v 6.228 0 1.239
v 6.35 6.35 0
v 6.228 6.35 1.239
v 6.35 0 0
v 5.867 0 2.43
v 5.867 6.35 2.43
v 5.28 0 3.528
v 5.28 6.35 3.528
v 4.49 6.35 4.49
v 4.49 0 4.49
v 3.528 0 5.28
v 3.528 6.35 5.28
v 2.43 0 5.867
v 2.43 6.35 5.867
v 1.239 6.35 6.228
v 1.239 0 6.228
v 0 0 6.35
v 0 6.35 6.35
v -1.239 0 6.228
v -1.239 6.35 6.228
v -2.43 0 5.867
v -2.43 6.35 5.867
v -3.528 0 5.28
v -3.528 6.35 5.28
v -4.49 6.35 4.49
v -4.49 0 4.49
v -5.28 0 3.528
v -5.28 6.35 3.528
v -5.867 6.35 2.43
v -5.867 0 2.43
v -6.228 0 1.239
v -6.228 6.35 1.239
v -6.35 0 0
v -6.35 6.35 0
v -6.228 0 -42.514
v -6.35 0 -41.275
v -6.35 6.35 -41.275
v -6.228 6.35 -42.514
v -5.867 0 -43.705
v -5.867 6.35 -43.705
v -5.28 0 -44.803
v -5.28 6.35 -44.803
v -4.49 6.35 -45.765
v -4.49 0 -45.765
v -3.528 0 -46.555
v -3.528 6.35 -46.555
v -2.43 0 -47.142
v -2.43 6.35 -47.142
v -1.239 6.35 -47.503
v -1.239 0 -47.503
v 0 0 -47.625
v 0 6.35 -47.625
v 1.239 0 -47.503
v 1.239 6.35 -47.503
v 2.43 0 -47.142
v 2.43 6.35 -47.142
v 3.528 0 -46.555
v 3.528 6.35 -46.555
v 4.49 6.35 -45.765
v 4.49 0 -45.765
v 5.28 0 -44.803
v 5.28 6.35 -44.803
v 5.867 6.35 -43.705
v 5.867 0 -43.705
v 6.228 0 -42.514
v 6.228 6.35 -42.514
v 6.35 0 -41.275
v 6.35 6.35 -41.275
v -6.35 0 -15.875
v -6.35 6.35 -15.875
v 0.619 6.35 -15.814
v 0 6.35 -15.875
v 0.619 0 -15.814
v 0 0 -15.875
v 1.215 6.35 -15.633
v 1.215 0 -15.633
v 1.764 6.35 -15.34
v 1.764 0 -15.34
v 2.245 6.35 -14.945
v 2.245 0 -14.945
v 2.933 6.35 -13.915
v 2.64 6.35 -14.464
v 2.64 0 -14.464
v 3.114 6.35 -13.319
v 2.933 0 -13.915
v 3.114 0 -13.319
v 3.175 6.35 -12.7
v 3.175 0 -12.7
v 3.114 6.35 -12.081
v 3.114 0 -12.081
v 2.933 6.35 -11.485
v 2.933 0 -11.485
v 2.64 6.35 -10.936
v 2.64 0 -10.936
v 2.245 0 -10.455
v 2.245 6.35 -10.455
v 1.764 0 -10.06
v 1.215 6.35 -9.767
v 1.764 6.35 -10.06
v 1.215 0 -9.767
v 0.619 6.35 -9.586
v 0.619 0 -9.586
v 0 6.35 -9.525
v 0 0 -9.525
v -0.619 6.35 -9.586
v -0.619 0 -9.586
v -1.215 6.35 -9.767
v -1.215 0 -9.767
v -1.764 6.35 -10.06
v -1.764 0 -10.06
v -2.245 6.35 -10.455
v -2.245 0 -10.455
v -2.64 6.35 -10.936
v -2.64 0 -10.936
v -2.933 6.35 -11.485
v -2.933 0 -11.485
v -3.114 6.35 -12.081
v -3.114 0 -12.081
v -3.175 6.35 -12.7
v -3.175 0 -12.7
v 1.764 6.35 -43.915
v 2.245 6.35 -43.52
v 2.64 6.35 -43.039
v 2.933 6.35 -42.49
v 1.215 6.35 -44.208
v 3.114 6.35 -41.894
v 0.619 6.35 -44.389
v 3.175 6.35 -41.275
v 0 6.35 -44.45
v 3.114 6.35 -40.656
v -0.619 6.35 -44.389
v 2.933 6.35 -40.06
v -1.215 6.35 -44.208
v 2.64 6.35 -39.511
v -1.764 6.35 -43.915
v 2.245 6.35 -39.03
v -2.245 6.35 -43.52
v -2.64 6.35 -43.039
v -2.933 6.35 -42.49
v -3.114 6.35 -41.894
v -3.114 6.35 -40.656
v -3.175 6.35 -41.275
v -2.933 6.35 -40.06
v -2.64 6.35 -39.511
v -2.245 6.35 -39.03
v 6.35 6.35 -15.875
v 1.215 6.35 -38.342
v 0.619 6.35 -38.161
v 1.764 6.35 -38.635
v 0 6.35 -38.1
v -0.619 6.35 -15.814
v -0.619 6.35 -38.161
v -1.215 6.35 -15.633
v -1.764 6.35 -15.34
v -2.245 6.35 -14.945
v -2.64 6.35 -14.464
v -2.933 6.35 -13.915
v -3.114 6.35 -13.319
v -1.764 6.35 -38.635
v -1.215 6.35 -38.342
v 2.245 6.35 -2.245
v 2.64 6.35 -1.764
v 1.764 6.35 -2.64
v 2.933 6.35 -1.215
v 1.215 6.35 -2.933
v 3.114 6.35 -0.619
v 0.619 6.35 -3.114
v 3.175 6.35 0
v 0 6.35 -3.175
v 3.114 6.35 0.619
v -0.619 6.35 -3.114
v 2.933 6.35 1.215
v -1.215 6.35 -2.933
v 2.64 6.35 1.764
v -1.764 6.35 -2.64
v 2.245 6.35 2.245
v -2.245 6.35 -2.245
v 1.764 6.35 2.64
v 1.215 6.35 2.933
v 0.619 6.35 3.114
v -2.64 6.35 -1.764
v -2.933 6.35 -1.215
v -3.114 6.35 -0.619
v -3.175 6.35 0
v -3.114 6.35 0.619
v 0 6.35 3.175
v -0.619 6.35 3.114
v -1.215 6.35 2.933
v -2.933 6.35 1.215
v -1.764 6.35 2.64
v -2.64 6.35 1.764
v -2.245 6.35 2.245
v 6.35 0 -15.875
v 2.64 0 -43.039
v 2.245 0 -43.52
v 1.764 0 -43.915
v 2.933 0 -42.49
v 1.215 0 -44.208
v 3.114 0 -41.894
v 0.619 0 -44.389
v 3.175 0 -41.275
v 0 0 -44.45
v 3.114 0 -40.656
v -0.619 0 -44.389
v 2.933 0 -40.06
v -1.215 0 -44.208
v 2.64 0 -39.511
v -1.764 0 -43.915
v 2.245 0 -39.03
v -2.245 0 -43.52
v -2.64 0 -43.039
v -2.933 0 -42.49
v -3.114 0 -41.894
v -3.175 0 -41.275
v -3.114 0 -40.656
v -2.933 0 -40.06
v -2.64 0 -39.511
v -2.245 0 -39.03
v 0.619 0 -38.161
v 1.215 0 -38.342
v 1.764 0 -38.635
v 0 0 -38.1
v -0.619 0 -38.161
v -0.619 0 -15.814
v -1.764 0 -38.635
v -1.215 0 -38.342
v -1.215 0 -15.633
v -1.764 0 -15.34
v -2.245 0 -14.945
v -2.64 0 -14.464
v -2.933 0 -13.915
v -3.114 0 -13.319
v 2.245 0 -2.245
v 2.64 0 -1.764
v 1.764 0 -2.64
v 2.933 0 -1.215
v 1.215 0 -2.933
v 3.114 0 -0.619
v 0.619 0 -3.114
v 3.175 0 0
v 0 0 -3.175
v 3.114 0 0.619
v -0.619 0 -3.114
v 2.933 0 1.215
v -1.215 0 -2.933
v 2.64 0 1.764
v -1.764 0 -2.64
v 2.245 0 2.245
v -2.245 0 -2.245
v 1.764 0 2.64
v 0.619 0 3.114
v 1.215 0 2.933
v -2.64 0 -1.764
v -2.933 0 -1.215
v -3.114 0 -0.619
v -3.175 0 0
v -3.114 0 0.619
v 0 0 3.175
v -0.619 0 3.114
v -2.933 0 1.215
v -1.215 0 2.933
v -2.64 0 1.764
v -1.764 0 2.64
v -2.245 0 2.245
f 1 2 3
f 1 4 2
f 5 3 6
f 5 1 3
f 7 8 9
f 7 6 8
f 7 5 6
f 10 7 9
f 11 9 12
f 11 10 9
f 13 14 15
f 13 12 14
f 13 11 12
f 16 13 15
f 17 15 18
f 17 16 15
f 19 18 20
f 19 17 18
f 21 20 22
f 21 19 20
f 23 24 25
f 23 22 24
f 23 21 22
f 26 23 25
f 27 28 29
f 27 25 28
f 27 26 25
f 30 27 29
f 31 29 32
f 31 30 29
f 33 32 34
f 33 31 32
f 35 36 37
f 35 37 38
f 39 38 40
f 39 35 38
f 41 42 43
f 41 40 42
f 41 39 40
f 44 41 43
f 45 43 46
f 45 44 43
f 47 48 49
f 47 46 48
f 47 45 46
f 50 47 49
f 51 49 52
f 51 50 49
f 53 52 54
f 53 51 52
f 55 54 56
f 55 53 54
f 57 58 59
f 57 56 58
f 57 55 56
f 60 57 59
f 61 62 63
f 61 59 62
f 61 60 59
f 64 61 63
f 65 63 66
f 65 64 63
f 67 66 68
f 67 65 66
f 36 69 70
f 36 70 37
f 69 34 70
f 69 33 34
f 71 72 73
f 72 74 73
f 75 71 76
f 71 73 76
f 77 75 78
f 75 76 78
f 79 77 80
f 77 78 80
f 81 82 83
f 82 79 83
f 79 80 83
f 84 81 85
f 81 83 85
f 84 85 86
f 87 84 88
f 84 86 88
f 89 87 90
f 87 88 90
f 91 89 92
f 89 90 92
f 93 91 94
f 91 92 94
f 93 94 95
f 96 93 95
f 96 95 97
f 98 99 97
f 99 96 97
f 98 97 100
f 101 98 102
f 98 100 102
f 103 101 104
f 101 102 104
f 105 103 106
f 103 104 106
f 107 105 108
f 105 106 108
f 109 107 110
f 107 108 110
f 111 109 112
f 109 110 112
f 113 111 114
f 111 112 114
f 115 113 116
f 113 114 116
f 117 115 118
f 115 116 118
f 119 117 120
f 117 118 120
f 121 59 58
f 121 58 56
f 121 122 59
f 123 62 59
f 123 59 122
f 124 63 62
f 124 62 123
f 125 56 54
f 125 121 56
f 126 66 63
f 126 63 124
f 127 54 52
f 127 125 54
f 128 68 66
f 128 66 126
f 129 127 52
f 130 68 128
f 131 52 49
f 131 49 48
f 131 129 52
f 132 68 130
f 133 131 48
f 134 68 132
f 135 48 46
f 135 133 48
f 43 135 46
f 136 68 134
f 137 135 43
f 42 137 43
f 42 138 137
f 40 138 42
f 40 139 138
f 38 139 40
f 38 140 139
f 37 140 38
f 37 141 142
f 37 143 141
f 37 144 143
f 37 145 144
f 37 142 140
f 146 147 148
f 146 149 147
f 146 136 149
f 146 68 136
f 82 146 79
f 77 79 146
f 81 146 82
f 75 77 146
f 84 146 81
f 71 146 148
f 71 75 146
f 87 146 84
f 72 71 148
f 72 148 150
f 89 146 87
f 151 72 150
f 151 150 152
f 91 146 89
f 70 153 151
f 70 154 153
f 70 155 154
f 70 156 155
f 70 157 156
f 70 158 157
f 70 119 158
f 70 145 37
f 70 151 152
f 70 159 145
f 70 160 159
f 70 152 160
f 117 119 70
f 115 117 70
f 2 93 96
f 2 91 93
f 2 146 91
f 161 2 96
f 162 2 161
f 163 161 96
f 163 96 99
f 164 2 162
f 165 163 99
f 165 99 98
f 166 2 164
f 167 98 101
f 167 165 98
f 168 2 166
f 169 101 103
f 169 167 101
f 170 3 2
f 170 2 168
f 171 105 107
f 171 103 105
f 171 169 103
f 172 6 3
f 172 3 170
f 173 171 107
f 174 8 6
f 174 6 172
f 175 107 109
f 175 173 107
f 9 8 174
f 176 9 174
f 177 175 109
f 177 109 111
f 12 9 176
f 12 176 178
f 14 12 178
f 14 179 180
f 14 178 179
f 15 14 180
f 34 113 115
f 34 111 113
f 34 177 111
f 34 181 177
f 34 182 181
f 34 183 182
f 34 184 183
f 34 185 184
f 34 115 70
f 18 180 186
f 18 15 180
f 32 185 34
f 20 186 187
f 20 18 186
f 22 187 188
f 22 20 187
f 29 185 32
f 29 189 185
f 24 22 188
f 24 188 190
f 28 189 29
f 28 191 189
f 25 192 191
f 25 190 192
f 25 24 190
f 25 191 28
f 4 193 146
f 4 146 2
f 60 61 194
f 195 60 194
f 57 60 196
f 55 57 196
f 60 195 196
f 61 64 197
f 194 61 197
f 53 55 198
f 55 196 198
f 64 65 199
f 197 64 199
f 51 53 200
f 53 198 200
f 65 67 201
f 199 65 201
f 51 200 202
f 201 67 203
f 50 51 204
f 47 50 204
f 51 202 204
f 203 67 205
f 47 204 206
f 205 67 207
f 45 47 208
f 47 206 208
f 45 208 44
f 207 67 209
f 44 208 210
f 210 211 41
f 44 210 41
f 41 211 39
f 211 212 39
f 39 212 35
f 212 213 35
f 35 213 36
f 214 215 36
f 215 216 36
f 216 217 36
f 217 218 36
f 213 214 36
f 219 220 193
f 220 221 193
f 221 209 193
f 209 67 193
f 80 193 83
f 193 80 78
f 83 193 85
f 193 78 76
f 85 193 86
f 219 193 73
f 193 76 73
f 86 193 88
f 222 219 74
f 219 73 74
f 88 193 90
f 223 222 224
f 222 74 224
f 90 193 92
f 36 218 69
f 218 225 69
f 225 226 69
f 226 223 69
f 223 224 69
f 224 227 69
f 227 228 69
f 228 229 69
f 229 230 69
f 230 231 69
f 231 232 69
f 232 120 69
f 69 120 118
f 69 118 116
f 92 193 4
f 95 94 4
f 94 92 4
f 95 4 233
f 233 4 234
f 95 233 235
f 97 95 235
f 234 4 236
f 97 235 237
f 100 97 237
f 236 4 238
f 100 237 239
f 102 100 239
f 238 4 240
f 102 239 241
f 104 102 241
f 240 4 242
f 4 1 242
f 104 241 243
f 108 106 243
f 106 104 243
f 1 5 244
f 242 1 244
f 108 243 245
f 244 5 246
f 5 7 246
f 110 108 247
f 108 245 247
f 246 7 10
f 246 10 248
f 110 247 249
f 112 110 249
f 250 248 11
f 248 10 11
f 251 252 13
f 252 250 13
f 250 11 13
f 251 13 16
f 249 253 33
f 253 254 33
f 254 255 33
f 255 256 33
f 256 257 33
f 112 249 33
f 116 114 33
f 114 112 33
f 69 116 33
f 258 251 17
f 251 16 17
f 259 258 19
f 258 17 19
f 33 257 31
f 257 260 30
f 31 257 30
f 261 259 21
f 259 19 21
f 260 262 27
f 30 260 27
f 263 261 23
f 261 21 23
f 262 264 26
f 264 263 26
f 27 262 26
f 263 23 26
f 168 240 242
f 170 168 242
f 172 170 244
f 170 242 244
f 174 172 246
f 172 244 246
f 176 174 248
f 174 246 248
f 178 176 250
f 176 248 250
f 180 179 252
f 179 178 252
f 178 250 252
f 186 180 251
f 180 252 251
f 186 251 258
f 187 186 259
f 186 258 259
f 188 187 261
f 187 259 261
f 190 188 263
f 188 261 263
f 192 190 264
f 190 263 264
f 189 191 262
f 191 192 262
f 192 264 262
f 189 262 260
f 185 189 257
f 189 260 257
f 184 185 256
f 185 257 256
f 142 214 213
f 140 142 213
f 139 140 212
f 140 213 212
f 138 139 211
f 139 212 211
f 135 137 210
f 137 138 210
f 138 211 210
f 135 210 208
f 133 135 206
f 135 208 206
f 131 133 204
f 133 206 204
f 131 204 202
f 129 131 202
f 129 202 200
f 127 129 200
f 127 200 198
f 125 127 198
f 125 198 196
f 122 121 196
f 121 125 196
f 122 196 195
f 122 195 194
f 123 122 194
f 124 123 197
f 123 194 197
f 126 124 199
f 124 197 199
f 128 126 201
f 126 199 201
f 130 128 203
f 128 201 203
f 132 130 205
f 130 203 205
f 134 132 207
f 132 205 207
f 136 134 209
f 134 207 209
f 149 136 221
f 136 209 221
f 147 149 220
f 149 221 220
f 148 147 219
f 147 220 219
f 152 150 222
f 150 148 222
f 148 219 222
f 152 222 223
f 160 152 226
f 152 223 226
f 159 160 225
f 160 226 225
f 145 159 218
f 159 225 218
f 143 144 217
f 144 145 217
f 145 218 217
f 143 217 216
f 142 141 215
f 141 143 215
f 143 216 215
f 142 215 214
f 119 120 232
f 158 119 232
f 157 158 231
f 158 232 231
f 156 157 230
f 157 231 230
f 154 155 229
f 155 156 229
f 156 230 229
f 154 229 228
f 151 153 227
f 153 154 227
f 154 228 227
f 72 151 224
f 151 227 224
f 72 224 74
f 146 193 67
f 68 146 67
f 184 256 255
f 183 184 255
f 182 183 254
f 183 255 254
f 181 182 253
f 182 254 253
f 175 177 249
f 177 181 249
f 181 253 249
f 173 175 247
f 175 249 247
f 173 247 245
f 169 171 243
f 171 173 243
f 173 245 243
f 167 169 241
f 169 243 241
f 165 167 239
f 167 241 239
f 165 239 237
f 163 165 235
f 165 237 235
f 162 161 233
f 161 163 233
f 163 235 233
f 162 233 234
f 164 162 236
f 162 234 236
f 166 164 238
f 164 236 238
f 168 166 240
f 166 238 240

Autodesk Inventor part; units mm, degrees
ref_plane "YZ Plane" through (0, 0, 0) normal (1, 0, 0) x (0, 1, 0)
ref_plane "XZ Plane" through (0, 0, 0) normal (0, 1, 0) x (-1, 0, 0)
ref_plane "XY Plane" through (0, 0, 0) normal (0, 0, 1) x (1, 0, 0)
sketch "Sketch1" plane through (0, 0, 0) normal (0, 1, 0) x (-1, 0, 0)
  circle A0 centre (0, 0) radius 3.175
  circle A1 centre (0, -12.7) radius 3.175
  line L0 (-6.35, -15.875) -> (-6.35, 0)
  line L1 (6.35, 0) -> (6.35, -15.875)
  line L2 (-6.35, 0) -> (-3.175, 0)
  line L3 (-6.35, -15.875) -> (-6.35, -41.275)
  circle A2 centre (0, -41.275) radius 3.175
  arc A3 (-6.35, -41.275) -> (6.35, -41.275) centre (0, -41.275) ccw
  line L4 (-6.35, -41.275) -> (-6.35, -15.875)
  line L5 (-6.35, -15.875) -> (0, -15.875)
  line L6 (6.35, -15.875) -> (6.35, -41.275)
  arc A4 (6.35, 0) -> (-6.35, 0) centre (0, 0) ccw
  point P0 (6.35, -7.9375)
  dimension "d0" = 6.35
  dimension "d1" = 6.35
  dimension "d14" = 6.35
  dimension "d17" = 12.7
  dimension "d18" = 6.35
  dimension "d19" = 6.35
  dimension "d20" = 12.7
  dimension "d21" = 12.7
  dimension "d22" = 12.7
extrude "Extrusion1" add sketch "Sketch1" along normal blind 6.35
properties part number "Gear to Finger Connect"
